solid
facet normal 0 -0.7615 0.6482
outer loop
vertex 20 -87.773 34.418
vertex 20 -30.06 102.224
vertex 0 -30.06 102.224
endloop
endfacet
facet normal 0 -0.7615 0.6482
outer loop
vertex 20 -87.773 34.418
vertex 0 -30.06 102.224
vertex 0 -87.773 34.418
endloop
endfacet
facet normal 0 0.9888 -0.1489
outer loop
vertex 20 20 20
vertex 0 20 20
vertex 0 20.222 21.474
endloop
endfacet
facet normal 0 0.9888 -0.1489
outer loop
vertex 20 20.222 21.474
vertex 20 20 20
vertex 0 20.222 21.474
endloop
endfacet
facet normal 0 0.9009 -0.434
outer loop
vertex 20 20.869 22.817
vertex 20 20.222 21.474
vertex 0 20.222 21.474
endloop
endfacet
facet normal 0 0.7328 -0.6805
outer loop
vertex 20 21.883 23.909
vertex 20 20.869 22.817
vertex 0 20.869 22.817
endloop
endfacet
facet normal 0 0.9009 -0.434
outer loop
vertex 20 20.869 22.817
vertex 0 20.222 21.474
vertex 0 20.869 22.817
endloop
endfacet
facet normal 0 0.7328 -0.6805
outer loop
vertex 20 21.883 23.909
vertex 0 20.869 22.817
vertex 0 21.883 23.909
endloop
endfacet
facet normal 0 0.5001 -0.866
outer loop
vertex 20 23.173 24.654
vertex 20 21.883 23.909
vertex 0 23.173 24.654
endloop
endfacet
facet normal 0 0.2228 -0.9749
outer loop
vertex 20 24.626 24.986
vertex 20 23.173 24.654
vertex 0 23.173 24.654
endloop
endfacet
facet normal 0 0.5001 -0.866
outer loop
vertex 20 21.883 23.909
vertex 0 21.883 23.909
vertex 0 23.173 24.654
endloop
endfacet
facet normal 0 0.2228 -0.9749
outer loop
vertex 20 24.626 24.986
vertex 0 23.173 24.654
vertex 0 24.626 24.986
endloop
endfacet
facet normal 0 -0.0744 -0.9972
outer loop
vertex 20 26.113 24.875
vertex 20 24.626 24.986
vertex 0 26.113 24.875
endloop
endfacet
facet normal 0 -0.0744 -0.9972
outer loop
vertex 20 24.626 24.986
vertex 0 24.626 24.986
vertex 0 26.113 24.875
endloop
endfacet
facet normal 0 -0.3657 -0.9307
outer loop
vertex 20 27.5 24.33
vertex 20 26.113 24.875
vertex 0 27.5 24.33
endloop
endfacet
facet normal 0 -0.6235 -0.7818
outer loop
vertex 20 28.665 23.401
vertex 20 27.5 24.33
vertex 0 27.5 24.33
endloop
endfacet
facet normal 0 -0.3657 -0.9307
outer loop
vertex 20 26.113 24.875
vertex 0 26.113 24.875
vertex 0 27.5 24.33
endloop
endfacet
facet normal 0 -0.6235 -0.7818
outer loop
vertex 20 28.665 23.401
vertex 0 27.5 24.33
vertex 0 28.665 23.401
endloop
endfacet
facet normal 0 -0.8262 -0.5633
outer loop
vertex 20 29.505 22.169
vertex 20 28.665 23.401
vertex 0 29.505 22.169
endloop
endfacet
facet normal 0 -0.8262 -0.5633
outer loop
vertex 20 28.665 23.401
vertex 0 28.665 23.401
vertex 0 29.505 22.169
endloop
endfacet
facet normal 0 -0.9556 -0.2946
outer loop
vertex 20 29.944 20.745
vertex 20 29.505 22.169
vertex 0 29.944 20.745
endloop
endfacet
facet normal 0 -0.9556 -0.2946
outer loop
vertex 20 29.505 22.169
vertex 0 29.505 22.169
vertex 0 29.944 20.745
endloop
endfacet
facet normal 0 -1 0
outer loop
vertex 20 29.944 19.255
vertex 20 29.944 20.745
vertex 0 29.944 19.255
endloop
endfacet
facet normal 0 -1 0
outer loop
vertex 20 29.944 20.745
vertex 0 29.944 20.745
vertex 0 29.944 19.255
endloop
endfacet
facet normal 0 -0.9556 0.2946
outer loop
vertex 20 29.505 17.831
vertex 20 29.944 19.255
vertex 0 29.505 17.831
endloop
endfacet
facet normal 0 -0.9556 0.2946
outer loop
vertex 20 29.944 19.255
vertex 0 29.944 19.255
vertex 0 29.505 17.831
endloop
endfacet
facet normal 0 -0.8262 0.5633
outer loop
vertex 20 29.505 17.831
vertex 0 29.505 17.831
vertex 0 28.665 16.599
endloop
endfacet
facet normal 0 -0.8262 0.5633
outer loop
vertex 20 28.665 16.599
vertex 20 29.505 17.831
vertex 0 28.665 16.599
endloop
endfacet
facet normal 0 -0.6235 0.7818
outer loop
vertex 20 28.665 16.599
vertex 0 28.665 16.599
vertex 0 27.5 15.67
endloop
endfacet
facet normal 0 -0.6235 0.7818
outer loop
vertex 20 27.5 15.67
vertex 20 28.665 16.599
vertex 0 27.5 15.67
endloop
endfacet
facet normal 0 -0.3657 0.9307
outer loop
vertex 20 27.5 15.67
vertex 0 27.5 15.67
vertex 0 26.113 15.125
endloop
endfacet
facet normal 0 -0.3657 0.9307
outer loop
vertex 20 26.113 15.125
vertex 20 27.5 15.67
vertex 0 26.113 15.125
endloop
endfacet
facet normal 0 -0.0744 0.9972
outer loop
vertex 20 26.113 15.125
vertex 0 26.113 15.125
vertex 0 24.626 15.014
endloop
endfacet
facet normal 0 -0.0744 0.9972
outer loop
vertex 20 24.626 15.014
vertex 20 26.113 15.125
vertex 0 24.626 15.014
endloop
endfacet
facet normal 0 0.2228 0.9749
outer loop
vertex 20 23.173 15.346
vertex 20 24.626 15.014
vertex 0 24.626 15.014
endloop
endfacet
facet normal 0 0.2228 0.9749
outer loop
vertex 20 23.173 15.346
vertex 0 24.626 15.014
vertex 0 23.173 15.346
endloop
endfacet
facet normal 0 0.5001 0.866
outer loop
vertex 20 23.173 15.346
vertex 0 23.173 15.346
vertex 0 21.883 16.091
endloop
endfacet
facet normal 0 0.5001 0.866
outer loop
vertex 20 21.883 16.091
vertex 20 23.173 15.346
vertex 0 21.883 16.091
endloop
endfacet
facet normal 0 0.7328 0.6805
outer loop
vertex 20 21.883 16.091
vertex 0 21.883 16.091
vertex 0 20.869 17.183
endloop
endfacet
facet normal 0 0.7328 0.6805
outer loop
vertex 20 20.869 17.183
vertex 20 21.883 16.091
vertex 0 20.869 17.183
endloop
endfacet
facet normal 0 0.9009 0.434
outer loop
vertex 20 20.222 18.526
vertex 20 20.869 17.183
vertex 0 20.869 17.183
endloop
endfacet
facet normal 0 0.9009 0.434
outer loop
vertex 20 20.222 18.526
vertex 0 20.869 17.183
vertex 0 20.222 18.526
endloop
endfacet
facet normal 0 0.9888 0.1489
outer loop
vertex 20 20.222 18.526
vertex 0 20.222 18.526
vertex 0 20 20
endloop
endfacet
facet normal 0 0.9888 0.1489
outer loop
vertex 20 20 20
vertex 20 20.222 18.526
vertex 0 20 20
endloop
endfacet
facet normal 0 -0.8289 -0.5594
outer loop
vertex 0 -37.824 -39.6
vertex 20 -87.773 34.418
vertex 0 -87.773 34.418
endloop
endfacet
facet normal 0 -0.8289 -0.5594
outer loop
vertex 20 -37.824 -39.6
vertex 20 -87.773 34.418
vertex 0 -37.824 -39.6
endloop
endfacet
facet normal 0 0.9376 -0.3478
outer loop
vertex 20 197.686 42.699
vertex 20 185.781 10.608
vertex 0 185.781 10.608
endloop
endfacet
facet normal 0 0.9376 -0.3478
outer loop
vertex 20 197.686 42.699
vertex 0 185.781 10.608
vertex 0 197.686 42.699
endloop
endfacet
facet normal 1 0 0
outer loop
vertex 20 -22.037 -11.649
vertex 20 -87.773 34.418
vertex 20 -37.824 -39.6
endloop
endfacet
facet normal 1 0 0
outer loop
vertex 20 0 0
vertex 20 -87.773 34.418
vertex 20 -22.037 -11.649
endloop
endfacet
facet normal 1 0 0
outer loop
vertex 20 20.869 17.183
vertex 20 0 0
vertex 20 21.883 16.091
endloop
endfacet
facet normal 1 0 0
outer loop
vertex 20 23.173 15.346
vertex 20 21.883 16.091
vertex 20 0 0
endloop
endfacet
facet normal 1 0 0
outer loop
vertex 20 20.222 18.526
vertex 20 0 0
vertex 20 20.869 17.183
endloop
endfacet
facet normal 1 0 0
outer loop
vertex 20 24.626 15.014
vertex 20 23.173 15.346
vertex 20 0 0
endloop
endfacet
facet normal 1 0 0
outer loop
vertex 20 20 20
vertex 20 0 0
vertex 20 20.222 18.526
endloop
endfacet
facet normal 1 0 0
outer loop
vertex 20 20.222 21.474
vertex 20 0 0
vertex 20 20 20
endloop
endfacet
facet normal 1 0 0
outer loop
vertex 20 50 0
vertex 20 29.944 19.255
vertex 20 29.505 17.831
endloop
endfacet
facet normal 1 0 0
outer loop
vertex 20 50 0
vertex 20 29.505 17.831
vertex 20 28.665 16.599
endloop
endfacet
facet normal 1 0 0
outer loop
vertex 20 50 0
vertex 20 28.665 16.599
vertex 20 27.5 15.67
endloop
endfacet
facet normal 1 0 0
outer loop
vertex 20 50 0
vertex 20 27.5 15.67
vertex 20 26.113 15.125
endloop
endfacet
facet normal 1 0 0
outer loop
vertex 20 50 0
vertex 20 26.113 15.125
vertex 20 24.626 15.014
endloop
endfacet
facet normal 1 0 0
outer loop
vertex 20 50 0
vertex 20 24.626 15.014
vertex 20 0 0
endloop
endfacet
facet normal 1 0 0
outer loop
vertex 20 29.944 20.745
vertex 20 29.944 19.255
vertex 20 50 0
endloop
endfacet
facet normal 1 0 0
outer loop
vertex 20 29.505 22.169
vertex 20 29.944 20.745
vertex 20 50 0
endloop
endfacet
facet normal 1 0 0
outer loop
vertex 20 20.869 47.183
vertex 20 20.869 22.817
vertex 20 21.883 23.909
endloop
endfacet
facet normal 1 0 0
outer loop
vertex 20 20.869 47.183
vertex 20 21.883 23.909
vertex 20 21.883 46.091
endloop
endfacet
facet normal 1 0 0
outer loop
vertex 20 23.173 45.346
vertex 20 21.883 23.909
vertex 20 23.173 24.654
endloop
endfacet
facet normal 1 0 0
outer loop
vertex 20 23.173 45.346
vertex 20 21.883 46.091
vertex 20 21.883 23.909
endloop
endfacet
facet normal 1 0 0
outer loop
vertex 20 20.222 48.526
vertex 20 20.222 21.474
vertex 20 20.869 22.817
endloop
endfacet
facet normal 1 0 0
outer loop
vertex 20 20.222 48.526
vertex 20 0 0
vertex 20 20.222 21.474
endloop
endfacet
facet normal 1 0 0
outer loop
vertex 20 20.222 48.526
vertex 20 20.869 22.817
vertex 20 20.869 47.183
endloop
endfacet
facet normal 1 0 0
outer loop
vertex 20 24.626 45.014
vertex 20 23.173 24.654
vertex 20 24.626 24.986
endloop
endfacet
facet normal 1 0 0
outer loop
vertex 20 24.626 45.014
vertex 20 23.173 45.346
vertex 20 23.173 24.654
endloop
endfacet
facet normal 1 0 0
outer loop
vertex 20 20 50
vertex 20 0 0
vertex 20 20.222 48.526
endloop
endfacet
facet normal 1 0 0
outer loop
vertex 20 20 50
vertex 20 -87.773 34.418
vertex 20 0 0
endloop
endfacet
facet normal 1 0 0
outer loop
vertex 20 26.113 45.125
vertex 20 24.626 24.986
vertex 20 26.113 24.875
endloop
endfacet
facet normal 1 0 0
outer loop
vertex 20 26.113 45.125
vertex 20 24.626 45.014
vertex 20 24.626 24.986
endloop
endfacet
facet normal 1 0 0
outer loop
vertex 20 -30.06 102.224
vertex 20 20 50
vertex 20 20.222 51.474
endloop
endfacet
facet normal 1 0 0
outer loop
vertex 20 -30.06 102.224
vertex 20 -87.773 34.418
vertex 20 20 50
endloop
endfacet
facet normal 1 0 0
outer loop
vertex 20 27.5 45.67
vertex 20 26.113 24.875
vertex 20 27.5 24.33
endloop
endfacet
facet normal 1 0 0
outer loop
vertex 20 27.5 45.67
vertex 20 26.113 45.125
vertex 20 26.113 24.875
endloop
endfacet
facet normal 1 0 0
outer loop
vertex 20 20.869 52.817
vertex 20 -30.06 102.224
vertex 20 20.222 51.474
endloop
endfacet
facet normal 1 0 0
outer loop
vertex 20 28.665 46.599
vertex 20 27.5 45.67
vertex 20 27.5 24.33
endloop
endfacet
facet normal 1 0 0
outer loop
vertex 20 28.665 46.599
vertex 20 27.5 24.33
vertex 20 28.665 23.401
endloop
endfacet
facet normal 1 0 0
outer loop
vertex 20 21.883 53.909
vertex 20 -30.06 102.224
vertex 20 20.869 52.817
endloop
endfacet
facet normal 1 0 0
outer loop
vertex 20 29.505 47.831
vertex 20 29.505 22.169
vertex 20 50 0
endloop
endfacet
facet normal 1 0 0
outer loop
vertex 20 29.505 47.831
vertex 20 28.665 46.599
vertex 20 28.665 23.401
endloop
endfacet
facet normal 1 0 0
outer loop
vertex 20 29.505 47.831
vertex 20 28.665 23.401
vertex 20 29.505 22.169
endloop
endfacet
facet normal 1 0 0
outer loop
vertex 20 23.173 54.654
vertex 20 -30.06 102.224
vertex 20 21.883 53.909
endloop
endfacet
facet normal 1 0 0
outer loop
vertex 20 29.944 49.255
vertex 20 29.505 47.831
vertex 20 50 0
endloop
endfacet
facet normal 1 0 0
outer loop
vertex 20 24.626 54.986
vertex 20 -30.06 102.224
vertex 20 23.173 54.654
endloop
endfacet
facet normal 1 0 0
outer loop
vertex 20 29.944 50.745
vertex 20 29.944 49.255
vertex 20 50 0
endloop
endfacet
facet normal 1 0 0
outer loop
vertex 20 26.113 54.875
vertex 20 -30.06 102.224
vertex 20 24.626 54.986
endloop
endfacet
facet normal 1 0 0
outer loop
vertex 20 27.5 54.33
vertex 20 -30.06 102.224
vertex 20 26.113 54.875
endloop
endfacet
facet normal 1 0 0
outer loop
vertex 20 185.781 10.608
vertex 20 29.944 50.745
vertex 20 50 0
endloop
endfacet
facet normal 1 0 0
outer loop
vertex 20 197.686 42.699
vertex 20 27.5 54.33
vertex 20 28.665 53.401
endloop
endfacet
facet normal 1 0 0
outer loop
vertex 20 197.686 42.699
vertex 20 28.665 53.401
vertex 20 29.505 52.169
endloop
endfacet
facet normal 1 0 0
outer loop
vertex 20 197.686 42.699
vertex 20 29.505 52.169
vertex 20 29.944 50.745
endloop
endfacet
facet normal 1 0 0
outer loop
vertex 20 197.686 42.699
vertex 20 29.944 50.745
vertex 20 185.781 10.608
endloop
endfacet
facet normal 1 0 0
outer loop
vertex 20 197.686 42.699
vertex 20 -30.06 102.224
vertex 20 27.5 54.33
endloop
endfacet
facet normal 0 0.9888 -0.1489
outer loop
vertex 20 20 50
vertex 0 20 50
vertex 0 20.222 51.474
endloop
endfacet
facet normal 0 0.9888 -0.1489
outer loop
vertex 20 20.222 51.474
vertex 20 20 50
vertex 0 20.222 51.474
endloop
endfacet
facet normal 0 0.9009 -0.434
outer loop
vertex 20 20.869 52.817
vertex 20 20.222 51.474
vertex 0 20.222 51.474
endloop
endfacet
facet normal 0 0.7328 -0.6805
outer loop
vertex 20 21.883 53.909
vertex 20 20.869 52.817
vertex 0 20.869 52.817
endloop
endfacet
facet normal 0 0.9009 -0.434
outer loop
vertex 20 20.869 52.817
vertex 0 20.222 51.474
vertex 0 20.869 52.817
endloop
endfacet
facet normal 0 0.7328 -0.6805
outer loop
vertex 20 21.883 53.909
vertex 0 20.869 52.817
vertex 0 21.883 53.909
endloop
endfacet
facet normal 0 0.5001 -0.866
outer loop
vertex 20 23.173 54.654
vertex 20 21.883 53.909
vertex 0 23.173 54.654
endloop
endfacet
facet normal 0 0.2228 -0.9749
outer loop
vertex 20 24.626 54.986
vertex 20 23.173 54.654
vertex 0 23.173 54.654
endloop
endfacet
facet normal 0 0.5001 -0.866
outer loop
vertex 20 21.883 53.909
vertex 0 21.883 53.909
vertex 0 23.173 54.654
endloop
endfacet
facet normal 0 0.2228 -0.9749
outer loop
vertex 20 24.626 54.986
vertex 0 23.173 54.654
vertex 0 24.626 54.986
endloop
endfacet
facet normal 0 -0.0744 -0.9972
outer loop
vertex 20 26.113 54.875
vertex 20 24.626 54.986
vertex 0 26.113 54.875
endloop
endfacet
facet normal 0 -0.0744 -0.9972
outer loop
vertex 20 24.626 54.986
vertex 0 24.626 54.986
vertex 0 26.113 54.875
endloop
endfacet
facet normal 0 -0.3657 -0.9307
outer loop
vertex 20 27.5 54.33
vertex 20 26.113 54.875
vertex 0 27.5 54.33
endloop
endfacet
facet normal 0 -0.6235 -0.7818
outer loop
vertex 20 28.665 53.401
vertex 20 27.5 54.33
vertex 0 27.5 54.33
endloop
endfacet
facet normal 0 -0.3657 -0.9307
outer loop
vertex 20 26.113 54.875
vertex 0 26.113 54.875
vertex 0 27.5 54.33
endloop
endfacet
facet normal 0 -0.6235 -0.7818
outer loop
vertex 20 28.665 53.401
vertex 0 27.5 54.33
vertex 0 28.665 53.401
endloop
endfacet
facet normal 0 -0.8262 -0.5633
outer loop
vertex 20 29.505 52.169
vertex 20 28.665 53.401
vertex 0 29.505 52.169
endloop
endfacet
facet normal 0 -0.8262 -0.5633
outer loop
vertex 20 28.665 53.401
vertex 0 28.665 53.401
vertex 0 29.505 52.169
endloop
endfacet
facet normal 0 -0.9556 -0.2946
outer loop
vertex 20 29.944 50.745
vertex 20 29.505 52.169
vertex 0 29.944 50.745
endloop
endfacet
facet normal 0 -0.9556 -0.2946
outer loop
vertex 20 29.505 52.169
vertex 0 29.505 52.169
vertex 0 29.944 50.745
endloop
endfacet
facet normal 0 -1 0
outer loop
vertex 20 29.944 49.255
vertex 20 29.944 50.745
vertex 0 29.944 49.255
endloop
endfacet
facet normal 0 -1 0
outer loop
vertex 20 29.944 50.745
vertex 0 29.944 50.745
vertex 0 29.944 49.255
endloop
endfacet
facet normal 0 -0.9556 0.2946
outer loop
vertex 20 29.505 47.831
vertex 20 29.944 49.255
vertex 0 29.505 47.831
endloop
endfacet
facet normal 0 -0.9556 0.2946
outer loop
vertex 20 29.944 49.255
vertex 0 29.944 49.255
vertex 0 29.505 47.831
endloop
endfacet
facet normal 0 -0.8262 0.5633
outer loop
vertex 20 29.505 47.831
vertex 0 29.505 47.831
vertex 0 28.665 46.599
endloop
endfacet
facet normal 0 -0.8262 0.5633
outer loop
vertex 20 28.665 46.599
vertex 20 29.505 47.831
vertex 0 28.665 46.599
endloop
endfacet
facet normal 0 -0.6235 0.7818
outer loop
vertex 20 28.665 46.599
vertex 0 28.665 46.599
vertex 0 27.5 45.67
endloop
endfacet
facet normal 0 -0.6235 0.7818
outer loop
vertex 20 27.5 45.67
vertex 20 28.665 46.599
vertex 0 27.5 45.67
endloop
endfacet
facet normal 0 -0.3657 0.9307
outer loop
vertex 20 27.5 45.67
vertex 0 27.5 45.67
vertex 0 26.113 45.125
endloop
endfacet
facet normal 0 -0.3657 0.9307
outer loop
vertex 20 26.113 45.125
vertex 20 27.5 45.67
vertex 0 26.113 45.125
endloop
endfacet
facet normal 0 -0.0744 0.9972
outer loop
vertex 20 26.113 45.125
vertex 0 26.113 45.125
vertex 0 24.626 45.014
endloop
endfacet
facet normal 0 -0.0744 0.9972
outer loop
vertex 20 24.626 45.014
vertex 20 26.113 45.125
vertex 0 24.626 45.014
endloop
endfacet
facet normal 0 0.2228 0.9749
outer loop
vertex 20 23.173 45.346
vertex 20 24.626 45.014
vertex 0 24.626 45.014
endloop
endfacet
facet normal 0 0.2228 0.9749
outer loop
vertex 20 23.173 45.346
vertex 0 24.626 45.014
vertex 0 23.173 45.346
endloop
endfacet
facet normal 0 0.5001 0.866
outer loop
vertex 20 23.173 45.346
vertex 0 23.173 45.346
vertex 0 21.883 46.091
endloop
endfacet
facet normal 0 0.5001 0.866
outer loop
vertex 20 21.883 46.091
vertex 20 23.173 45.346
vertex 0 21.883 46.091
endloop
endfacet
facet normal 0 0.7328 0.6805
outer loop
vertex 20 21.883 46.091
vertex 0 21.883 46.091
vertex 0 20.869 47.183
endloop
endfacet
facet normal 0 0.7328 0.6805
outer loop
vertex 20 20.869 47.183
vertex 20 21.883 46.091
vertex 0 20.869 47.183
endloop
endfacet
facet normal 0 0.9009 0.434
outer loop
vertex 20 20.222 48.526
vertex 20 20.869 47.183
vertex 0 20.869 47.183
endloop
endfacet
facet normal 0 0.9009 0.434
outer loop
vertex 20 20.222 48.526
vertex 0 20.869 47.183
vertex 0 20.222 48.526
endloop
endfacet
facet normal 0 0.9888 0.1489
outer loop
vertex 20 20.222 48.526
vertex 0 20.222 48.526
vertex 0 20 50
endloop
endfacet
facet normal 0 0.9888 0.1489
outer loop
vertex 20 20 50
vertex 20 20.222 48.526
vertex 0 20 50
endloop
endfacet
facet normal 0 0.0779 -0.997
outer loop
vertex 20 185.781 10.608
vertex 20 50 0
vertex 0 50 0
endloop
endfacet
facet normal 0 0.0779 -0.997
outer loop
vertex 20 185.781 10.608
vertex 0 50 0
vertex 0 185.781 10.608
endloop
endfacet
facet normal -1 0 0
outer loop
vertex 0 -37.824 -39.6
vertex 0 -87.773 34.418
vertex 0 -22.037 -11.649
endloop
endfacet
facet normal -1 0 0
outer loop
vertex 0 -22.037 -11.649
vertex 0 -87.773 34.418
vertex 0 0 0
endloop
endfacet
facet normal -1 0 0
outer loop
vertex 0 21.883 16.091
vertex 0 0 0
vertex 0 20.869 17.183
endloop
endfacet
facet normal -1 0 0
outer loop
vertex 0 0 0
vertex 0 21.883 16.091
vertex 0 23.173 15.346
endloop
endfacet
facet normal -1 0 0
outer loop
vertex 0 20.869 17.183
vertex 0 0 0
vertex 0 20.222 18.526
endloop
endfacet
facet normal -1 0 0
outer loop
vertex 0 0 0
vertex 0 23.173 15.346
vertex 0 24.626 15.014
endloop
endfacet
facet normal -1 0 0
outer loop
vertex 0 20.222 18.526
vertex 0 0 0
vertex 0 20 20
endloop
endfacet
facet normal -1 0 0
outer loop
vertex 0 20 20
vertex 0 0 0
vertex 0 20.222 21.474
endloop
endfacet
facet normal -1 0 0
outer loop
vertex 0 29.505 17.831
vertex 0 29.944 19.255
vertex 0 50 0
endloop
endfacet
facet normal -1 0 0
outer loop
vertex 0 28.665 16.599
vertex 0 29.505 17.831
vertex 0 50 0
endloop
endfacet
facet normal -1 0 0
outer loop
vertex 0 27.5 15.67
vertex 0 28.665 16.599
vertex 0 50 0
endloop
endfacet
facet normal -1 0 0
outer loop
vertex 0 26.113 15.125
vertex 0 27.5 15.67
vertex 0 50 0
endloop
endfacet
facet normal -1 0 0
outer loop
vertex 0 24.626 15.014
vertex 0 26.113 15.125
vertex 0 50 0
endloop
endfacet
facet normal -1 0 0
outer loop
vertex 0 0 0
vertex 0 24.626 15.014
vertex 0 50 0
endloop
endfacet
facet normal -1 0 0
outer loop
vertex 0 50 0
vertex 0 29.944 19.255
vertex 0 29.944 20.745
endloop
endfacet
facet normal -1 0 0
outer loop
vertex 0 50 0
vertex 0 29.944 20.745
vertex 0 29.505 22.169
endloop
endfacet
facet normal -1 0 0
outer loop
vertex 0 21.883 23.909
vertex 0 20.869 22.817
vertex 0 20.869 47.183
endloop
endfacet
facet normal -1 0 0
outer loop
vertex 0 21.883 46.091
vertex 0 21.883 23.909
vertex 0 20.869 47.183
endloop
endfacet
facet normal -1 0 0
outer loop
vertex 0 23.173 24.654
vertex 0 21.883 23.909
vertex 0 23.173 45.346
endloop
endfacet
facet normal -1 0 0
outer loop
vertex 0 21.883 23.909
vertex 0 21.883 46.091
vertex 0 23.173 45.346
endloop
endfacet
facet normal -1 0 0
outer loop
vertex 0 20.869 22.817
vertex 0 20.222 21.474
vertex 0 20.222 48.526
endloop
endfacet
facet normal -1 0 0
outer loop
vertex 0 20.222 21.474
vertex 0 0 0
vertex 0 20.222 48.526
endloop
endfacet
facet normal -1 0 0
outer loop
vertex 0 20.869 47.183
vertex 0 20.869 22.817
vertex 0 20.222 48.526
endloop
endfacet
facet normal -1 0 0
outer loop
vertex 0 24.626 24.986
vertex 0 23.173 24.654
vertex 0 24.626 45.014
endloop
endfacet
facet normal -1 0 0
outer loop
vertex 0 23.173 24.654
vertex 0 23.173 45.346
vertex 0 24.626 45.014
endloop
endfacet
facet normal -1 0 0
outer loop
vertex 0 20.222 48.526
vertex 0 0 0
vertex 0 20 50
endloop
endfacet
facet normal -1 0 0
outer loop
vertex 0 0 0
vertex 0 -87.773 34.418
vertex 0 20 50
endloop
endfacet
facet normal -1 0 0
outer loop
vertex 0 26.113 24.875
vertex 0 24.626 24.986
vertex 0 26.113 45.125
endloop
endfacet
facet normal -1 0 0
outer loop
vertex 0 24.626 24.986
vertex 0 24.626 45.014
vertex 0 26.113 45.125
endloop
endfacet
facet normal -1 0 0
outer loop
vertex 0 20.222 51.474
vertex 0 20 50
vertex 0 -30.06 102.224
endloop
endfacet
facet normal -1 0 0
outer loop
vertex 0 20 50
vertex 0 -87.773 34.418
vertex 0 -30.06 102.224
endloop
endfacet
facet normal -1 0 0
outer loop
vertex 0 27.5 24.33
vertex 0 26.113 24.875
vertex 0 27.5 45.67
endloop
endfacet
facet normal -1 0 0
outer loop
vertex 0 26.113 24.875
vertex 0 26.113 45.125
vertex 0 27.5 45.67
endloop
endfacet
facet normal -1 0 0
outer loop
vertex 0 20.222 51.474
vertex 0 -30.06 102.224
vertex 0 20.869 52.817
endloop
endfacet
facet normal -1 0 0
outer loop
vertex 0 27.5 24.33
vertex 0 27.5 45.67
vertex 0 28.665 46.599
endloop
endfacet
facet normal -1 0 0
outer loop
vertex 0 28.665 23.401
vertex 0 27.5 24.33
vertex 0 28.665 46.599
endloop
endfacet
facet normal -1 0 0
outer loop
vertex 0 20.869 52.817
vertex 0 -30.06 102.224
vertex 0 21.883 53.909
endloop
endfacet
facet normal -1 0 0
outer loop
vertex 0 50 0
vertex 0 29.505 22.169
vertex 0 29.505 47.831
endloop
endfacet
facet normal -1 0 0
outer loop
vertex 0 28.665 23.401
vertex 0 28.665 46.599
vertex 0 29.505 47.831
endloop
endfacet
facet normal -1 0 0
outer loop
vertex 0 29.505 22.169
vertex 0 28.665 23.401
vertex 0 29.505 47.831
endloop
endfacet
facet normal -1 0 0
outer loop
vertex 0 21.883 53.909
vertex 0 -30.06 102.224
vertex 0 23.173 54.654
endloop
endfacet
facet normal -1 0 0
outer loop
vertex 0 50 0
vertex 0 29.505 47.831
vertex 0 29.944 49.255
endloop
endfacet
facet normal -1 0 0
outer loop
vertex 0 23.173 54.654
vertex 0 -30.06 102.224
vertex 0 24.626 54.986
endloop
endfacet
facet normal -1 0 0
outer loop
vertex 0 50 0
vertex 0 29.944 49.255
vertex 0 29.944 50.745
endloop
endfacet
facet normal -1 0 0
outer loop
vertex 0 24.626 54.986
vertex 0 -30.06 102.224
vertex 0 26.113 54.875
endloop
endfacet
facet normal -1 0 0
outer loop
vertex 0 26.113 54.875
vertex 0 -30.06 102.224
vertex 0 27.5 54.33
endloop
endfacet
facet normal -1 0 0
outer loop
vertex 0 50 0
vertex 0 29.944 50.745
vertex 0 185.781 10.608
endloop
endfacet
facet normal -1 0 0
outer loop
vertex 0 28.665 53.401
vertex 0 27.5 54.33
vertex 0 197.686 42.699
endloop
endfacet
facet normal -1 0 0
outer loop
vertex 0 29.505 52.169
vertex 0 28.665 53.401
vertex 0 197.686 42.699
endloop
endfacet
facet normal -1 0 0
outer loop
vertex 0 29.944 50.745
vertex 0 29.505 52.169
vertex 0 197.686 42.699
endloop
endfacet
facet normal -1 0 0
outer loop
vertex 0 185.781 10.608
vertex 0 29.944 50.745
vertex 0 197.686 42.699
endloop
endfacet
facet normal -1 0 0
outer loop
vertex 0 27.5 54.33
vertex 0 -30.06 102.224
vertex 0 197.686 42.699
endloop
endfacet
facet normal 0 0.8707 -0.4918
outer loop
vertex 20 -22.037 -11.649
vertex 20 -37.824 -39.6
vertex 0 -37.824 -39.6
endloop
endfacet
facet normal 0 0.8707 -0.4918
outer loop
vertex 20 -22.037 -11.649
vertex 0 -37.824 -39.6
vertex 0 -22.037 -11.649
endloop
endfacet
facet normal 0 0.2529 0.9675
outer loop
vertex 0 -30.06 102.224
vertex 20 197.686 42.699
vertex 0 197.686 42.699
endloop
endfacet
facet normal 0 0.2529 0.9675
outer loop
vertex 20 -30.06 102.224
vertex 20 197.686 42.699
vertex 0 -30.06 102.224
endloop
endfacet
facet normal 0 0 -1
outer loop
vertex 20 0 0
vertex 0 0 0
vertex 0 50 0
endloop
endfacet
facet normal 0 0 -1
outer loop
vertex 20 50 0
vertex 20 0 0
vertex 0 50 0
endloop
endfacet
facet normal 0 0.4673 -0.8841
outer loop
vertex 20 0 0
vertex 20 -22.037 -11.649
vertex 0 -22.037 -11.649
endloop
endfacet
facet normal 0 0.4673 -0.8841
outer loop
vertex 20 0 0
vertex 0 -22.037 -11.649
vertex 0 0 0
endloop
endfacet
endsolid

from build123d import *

# Parameters (mm, degrees)
F0_W     = 50
F0_H     = 70
F1_DEPTH = 20
F3_D     = 10
F3_DEPTH = 100
F5_DEPTH = 20


with BuildPart() as f1:
    # F0 (on Right) → F1 (new body)
    with BuildSketch(Plane.YZ):
        with Locations((25, 35)):
            Rectangle(F0_W, F0_H)
    extrude(amount=F1_DEPTH)

    # F3
    with Locations(Plane.YZ.offset(20)):
        with Locations((25, 20), (25, 50)):
            Hole(F3_D / 2, depth=F3_DEPTH)

    # F4 (on face) → F5 (join)
    with BuildSketch(Plane.YZ.offset(20)):
        Polygon((-22.037402, -11.649207), (0, 0), (0, 70), (50, 70), (50, 0), (185.781255, 10.607836), (197.686195, 42.699385), (-30.06028, 102.22403), (-87.773323, 34.417696), (-37.824381, -39.59991), align=None)
    extrude(amount=-F5_DEPTH)


solid = f1.part
